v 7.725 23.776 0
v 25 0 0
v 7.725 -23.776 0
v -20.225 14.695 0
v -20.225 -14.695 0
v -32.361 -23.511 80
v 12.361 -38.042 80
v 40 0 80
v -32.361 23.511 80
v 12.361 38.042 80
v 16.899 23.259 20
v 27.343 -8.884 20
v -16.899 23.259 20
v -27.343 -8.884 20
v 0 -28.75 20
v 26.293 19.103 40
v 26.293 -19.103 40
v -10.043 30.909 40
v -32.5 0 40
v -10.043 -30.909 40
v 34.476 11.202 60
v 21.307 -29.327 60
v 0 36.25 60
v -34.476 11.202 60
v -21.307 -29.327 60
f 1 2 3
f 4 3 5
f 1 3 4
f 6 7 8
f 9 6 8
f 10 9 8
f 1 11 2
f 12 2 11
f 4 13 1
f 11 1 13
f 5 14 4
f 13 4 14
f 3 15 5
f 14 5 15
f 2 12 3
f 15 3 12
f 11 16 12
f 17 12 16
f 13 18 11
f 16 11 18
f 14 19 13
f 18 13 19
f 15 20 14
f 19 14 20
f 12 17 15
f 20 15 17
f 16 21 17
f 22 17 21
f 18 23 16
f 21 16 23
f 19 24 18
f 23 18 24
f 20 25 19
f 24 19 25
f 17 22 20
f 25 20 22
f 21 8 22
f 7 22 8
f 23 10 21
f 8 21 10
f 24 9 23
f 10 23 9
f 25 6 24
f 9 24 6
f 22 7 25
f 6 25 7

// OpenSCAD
// Customizable Twisted Polygon Vase

use <MCAD/regular_shapes.scad>;

/* [Vase Design] */

// Vases is an extruded regular polygon
number_of_sides = 5;

// Height of vase (mm)
vase_height = 80;

// Bottom circumradius (mm from center to corner)
bottom_radius = 25;

// Top circumradius (mm from center to corner)
top_radius = 40;

// Clockwise twist of top surface relative to bottom (degrees).
top_rotation = 72;

// Low values yield a faceted appearance. High values yield a smooth appearance. No effect if 0 rotation.
slice_layers = 4;

/* [Hidden] */

top_scale = top_radius / bottom_radius;

linear_extrude(
		height = vase_height,
		twist  = top_rotation,
		slices = slice_layers,
		scale  = top_scale)

reg_polygon(
		sides  = number_of_sides,
		radius = bottom_radius);
